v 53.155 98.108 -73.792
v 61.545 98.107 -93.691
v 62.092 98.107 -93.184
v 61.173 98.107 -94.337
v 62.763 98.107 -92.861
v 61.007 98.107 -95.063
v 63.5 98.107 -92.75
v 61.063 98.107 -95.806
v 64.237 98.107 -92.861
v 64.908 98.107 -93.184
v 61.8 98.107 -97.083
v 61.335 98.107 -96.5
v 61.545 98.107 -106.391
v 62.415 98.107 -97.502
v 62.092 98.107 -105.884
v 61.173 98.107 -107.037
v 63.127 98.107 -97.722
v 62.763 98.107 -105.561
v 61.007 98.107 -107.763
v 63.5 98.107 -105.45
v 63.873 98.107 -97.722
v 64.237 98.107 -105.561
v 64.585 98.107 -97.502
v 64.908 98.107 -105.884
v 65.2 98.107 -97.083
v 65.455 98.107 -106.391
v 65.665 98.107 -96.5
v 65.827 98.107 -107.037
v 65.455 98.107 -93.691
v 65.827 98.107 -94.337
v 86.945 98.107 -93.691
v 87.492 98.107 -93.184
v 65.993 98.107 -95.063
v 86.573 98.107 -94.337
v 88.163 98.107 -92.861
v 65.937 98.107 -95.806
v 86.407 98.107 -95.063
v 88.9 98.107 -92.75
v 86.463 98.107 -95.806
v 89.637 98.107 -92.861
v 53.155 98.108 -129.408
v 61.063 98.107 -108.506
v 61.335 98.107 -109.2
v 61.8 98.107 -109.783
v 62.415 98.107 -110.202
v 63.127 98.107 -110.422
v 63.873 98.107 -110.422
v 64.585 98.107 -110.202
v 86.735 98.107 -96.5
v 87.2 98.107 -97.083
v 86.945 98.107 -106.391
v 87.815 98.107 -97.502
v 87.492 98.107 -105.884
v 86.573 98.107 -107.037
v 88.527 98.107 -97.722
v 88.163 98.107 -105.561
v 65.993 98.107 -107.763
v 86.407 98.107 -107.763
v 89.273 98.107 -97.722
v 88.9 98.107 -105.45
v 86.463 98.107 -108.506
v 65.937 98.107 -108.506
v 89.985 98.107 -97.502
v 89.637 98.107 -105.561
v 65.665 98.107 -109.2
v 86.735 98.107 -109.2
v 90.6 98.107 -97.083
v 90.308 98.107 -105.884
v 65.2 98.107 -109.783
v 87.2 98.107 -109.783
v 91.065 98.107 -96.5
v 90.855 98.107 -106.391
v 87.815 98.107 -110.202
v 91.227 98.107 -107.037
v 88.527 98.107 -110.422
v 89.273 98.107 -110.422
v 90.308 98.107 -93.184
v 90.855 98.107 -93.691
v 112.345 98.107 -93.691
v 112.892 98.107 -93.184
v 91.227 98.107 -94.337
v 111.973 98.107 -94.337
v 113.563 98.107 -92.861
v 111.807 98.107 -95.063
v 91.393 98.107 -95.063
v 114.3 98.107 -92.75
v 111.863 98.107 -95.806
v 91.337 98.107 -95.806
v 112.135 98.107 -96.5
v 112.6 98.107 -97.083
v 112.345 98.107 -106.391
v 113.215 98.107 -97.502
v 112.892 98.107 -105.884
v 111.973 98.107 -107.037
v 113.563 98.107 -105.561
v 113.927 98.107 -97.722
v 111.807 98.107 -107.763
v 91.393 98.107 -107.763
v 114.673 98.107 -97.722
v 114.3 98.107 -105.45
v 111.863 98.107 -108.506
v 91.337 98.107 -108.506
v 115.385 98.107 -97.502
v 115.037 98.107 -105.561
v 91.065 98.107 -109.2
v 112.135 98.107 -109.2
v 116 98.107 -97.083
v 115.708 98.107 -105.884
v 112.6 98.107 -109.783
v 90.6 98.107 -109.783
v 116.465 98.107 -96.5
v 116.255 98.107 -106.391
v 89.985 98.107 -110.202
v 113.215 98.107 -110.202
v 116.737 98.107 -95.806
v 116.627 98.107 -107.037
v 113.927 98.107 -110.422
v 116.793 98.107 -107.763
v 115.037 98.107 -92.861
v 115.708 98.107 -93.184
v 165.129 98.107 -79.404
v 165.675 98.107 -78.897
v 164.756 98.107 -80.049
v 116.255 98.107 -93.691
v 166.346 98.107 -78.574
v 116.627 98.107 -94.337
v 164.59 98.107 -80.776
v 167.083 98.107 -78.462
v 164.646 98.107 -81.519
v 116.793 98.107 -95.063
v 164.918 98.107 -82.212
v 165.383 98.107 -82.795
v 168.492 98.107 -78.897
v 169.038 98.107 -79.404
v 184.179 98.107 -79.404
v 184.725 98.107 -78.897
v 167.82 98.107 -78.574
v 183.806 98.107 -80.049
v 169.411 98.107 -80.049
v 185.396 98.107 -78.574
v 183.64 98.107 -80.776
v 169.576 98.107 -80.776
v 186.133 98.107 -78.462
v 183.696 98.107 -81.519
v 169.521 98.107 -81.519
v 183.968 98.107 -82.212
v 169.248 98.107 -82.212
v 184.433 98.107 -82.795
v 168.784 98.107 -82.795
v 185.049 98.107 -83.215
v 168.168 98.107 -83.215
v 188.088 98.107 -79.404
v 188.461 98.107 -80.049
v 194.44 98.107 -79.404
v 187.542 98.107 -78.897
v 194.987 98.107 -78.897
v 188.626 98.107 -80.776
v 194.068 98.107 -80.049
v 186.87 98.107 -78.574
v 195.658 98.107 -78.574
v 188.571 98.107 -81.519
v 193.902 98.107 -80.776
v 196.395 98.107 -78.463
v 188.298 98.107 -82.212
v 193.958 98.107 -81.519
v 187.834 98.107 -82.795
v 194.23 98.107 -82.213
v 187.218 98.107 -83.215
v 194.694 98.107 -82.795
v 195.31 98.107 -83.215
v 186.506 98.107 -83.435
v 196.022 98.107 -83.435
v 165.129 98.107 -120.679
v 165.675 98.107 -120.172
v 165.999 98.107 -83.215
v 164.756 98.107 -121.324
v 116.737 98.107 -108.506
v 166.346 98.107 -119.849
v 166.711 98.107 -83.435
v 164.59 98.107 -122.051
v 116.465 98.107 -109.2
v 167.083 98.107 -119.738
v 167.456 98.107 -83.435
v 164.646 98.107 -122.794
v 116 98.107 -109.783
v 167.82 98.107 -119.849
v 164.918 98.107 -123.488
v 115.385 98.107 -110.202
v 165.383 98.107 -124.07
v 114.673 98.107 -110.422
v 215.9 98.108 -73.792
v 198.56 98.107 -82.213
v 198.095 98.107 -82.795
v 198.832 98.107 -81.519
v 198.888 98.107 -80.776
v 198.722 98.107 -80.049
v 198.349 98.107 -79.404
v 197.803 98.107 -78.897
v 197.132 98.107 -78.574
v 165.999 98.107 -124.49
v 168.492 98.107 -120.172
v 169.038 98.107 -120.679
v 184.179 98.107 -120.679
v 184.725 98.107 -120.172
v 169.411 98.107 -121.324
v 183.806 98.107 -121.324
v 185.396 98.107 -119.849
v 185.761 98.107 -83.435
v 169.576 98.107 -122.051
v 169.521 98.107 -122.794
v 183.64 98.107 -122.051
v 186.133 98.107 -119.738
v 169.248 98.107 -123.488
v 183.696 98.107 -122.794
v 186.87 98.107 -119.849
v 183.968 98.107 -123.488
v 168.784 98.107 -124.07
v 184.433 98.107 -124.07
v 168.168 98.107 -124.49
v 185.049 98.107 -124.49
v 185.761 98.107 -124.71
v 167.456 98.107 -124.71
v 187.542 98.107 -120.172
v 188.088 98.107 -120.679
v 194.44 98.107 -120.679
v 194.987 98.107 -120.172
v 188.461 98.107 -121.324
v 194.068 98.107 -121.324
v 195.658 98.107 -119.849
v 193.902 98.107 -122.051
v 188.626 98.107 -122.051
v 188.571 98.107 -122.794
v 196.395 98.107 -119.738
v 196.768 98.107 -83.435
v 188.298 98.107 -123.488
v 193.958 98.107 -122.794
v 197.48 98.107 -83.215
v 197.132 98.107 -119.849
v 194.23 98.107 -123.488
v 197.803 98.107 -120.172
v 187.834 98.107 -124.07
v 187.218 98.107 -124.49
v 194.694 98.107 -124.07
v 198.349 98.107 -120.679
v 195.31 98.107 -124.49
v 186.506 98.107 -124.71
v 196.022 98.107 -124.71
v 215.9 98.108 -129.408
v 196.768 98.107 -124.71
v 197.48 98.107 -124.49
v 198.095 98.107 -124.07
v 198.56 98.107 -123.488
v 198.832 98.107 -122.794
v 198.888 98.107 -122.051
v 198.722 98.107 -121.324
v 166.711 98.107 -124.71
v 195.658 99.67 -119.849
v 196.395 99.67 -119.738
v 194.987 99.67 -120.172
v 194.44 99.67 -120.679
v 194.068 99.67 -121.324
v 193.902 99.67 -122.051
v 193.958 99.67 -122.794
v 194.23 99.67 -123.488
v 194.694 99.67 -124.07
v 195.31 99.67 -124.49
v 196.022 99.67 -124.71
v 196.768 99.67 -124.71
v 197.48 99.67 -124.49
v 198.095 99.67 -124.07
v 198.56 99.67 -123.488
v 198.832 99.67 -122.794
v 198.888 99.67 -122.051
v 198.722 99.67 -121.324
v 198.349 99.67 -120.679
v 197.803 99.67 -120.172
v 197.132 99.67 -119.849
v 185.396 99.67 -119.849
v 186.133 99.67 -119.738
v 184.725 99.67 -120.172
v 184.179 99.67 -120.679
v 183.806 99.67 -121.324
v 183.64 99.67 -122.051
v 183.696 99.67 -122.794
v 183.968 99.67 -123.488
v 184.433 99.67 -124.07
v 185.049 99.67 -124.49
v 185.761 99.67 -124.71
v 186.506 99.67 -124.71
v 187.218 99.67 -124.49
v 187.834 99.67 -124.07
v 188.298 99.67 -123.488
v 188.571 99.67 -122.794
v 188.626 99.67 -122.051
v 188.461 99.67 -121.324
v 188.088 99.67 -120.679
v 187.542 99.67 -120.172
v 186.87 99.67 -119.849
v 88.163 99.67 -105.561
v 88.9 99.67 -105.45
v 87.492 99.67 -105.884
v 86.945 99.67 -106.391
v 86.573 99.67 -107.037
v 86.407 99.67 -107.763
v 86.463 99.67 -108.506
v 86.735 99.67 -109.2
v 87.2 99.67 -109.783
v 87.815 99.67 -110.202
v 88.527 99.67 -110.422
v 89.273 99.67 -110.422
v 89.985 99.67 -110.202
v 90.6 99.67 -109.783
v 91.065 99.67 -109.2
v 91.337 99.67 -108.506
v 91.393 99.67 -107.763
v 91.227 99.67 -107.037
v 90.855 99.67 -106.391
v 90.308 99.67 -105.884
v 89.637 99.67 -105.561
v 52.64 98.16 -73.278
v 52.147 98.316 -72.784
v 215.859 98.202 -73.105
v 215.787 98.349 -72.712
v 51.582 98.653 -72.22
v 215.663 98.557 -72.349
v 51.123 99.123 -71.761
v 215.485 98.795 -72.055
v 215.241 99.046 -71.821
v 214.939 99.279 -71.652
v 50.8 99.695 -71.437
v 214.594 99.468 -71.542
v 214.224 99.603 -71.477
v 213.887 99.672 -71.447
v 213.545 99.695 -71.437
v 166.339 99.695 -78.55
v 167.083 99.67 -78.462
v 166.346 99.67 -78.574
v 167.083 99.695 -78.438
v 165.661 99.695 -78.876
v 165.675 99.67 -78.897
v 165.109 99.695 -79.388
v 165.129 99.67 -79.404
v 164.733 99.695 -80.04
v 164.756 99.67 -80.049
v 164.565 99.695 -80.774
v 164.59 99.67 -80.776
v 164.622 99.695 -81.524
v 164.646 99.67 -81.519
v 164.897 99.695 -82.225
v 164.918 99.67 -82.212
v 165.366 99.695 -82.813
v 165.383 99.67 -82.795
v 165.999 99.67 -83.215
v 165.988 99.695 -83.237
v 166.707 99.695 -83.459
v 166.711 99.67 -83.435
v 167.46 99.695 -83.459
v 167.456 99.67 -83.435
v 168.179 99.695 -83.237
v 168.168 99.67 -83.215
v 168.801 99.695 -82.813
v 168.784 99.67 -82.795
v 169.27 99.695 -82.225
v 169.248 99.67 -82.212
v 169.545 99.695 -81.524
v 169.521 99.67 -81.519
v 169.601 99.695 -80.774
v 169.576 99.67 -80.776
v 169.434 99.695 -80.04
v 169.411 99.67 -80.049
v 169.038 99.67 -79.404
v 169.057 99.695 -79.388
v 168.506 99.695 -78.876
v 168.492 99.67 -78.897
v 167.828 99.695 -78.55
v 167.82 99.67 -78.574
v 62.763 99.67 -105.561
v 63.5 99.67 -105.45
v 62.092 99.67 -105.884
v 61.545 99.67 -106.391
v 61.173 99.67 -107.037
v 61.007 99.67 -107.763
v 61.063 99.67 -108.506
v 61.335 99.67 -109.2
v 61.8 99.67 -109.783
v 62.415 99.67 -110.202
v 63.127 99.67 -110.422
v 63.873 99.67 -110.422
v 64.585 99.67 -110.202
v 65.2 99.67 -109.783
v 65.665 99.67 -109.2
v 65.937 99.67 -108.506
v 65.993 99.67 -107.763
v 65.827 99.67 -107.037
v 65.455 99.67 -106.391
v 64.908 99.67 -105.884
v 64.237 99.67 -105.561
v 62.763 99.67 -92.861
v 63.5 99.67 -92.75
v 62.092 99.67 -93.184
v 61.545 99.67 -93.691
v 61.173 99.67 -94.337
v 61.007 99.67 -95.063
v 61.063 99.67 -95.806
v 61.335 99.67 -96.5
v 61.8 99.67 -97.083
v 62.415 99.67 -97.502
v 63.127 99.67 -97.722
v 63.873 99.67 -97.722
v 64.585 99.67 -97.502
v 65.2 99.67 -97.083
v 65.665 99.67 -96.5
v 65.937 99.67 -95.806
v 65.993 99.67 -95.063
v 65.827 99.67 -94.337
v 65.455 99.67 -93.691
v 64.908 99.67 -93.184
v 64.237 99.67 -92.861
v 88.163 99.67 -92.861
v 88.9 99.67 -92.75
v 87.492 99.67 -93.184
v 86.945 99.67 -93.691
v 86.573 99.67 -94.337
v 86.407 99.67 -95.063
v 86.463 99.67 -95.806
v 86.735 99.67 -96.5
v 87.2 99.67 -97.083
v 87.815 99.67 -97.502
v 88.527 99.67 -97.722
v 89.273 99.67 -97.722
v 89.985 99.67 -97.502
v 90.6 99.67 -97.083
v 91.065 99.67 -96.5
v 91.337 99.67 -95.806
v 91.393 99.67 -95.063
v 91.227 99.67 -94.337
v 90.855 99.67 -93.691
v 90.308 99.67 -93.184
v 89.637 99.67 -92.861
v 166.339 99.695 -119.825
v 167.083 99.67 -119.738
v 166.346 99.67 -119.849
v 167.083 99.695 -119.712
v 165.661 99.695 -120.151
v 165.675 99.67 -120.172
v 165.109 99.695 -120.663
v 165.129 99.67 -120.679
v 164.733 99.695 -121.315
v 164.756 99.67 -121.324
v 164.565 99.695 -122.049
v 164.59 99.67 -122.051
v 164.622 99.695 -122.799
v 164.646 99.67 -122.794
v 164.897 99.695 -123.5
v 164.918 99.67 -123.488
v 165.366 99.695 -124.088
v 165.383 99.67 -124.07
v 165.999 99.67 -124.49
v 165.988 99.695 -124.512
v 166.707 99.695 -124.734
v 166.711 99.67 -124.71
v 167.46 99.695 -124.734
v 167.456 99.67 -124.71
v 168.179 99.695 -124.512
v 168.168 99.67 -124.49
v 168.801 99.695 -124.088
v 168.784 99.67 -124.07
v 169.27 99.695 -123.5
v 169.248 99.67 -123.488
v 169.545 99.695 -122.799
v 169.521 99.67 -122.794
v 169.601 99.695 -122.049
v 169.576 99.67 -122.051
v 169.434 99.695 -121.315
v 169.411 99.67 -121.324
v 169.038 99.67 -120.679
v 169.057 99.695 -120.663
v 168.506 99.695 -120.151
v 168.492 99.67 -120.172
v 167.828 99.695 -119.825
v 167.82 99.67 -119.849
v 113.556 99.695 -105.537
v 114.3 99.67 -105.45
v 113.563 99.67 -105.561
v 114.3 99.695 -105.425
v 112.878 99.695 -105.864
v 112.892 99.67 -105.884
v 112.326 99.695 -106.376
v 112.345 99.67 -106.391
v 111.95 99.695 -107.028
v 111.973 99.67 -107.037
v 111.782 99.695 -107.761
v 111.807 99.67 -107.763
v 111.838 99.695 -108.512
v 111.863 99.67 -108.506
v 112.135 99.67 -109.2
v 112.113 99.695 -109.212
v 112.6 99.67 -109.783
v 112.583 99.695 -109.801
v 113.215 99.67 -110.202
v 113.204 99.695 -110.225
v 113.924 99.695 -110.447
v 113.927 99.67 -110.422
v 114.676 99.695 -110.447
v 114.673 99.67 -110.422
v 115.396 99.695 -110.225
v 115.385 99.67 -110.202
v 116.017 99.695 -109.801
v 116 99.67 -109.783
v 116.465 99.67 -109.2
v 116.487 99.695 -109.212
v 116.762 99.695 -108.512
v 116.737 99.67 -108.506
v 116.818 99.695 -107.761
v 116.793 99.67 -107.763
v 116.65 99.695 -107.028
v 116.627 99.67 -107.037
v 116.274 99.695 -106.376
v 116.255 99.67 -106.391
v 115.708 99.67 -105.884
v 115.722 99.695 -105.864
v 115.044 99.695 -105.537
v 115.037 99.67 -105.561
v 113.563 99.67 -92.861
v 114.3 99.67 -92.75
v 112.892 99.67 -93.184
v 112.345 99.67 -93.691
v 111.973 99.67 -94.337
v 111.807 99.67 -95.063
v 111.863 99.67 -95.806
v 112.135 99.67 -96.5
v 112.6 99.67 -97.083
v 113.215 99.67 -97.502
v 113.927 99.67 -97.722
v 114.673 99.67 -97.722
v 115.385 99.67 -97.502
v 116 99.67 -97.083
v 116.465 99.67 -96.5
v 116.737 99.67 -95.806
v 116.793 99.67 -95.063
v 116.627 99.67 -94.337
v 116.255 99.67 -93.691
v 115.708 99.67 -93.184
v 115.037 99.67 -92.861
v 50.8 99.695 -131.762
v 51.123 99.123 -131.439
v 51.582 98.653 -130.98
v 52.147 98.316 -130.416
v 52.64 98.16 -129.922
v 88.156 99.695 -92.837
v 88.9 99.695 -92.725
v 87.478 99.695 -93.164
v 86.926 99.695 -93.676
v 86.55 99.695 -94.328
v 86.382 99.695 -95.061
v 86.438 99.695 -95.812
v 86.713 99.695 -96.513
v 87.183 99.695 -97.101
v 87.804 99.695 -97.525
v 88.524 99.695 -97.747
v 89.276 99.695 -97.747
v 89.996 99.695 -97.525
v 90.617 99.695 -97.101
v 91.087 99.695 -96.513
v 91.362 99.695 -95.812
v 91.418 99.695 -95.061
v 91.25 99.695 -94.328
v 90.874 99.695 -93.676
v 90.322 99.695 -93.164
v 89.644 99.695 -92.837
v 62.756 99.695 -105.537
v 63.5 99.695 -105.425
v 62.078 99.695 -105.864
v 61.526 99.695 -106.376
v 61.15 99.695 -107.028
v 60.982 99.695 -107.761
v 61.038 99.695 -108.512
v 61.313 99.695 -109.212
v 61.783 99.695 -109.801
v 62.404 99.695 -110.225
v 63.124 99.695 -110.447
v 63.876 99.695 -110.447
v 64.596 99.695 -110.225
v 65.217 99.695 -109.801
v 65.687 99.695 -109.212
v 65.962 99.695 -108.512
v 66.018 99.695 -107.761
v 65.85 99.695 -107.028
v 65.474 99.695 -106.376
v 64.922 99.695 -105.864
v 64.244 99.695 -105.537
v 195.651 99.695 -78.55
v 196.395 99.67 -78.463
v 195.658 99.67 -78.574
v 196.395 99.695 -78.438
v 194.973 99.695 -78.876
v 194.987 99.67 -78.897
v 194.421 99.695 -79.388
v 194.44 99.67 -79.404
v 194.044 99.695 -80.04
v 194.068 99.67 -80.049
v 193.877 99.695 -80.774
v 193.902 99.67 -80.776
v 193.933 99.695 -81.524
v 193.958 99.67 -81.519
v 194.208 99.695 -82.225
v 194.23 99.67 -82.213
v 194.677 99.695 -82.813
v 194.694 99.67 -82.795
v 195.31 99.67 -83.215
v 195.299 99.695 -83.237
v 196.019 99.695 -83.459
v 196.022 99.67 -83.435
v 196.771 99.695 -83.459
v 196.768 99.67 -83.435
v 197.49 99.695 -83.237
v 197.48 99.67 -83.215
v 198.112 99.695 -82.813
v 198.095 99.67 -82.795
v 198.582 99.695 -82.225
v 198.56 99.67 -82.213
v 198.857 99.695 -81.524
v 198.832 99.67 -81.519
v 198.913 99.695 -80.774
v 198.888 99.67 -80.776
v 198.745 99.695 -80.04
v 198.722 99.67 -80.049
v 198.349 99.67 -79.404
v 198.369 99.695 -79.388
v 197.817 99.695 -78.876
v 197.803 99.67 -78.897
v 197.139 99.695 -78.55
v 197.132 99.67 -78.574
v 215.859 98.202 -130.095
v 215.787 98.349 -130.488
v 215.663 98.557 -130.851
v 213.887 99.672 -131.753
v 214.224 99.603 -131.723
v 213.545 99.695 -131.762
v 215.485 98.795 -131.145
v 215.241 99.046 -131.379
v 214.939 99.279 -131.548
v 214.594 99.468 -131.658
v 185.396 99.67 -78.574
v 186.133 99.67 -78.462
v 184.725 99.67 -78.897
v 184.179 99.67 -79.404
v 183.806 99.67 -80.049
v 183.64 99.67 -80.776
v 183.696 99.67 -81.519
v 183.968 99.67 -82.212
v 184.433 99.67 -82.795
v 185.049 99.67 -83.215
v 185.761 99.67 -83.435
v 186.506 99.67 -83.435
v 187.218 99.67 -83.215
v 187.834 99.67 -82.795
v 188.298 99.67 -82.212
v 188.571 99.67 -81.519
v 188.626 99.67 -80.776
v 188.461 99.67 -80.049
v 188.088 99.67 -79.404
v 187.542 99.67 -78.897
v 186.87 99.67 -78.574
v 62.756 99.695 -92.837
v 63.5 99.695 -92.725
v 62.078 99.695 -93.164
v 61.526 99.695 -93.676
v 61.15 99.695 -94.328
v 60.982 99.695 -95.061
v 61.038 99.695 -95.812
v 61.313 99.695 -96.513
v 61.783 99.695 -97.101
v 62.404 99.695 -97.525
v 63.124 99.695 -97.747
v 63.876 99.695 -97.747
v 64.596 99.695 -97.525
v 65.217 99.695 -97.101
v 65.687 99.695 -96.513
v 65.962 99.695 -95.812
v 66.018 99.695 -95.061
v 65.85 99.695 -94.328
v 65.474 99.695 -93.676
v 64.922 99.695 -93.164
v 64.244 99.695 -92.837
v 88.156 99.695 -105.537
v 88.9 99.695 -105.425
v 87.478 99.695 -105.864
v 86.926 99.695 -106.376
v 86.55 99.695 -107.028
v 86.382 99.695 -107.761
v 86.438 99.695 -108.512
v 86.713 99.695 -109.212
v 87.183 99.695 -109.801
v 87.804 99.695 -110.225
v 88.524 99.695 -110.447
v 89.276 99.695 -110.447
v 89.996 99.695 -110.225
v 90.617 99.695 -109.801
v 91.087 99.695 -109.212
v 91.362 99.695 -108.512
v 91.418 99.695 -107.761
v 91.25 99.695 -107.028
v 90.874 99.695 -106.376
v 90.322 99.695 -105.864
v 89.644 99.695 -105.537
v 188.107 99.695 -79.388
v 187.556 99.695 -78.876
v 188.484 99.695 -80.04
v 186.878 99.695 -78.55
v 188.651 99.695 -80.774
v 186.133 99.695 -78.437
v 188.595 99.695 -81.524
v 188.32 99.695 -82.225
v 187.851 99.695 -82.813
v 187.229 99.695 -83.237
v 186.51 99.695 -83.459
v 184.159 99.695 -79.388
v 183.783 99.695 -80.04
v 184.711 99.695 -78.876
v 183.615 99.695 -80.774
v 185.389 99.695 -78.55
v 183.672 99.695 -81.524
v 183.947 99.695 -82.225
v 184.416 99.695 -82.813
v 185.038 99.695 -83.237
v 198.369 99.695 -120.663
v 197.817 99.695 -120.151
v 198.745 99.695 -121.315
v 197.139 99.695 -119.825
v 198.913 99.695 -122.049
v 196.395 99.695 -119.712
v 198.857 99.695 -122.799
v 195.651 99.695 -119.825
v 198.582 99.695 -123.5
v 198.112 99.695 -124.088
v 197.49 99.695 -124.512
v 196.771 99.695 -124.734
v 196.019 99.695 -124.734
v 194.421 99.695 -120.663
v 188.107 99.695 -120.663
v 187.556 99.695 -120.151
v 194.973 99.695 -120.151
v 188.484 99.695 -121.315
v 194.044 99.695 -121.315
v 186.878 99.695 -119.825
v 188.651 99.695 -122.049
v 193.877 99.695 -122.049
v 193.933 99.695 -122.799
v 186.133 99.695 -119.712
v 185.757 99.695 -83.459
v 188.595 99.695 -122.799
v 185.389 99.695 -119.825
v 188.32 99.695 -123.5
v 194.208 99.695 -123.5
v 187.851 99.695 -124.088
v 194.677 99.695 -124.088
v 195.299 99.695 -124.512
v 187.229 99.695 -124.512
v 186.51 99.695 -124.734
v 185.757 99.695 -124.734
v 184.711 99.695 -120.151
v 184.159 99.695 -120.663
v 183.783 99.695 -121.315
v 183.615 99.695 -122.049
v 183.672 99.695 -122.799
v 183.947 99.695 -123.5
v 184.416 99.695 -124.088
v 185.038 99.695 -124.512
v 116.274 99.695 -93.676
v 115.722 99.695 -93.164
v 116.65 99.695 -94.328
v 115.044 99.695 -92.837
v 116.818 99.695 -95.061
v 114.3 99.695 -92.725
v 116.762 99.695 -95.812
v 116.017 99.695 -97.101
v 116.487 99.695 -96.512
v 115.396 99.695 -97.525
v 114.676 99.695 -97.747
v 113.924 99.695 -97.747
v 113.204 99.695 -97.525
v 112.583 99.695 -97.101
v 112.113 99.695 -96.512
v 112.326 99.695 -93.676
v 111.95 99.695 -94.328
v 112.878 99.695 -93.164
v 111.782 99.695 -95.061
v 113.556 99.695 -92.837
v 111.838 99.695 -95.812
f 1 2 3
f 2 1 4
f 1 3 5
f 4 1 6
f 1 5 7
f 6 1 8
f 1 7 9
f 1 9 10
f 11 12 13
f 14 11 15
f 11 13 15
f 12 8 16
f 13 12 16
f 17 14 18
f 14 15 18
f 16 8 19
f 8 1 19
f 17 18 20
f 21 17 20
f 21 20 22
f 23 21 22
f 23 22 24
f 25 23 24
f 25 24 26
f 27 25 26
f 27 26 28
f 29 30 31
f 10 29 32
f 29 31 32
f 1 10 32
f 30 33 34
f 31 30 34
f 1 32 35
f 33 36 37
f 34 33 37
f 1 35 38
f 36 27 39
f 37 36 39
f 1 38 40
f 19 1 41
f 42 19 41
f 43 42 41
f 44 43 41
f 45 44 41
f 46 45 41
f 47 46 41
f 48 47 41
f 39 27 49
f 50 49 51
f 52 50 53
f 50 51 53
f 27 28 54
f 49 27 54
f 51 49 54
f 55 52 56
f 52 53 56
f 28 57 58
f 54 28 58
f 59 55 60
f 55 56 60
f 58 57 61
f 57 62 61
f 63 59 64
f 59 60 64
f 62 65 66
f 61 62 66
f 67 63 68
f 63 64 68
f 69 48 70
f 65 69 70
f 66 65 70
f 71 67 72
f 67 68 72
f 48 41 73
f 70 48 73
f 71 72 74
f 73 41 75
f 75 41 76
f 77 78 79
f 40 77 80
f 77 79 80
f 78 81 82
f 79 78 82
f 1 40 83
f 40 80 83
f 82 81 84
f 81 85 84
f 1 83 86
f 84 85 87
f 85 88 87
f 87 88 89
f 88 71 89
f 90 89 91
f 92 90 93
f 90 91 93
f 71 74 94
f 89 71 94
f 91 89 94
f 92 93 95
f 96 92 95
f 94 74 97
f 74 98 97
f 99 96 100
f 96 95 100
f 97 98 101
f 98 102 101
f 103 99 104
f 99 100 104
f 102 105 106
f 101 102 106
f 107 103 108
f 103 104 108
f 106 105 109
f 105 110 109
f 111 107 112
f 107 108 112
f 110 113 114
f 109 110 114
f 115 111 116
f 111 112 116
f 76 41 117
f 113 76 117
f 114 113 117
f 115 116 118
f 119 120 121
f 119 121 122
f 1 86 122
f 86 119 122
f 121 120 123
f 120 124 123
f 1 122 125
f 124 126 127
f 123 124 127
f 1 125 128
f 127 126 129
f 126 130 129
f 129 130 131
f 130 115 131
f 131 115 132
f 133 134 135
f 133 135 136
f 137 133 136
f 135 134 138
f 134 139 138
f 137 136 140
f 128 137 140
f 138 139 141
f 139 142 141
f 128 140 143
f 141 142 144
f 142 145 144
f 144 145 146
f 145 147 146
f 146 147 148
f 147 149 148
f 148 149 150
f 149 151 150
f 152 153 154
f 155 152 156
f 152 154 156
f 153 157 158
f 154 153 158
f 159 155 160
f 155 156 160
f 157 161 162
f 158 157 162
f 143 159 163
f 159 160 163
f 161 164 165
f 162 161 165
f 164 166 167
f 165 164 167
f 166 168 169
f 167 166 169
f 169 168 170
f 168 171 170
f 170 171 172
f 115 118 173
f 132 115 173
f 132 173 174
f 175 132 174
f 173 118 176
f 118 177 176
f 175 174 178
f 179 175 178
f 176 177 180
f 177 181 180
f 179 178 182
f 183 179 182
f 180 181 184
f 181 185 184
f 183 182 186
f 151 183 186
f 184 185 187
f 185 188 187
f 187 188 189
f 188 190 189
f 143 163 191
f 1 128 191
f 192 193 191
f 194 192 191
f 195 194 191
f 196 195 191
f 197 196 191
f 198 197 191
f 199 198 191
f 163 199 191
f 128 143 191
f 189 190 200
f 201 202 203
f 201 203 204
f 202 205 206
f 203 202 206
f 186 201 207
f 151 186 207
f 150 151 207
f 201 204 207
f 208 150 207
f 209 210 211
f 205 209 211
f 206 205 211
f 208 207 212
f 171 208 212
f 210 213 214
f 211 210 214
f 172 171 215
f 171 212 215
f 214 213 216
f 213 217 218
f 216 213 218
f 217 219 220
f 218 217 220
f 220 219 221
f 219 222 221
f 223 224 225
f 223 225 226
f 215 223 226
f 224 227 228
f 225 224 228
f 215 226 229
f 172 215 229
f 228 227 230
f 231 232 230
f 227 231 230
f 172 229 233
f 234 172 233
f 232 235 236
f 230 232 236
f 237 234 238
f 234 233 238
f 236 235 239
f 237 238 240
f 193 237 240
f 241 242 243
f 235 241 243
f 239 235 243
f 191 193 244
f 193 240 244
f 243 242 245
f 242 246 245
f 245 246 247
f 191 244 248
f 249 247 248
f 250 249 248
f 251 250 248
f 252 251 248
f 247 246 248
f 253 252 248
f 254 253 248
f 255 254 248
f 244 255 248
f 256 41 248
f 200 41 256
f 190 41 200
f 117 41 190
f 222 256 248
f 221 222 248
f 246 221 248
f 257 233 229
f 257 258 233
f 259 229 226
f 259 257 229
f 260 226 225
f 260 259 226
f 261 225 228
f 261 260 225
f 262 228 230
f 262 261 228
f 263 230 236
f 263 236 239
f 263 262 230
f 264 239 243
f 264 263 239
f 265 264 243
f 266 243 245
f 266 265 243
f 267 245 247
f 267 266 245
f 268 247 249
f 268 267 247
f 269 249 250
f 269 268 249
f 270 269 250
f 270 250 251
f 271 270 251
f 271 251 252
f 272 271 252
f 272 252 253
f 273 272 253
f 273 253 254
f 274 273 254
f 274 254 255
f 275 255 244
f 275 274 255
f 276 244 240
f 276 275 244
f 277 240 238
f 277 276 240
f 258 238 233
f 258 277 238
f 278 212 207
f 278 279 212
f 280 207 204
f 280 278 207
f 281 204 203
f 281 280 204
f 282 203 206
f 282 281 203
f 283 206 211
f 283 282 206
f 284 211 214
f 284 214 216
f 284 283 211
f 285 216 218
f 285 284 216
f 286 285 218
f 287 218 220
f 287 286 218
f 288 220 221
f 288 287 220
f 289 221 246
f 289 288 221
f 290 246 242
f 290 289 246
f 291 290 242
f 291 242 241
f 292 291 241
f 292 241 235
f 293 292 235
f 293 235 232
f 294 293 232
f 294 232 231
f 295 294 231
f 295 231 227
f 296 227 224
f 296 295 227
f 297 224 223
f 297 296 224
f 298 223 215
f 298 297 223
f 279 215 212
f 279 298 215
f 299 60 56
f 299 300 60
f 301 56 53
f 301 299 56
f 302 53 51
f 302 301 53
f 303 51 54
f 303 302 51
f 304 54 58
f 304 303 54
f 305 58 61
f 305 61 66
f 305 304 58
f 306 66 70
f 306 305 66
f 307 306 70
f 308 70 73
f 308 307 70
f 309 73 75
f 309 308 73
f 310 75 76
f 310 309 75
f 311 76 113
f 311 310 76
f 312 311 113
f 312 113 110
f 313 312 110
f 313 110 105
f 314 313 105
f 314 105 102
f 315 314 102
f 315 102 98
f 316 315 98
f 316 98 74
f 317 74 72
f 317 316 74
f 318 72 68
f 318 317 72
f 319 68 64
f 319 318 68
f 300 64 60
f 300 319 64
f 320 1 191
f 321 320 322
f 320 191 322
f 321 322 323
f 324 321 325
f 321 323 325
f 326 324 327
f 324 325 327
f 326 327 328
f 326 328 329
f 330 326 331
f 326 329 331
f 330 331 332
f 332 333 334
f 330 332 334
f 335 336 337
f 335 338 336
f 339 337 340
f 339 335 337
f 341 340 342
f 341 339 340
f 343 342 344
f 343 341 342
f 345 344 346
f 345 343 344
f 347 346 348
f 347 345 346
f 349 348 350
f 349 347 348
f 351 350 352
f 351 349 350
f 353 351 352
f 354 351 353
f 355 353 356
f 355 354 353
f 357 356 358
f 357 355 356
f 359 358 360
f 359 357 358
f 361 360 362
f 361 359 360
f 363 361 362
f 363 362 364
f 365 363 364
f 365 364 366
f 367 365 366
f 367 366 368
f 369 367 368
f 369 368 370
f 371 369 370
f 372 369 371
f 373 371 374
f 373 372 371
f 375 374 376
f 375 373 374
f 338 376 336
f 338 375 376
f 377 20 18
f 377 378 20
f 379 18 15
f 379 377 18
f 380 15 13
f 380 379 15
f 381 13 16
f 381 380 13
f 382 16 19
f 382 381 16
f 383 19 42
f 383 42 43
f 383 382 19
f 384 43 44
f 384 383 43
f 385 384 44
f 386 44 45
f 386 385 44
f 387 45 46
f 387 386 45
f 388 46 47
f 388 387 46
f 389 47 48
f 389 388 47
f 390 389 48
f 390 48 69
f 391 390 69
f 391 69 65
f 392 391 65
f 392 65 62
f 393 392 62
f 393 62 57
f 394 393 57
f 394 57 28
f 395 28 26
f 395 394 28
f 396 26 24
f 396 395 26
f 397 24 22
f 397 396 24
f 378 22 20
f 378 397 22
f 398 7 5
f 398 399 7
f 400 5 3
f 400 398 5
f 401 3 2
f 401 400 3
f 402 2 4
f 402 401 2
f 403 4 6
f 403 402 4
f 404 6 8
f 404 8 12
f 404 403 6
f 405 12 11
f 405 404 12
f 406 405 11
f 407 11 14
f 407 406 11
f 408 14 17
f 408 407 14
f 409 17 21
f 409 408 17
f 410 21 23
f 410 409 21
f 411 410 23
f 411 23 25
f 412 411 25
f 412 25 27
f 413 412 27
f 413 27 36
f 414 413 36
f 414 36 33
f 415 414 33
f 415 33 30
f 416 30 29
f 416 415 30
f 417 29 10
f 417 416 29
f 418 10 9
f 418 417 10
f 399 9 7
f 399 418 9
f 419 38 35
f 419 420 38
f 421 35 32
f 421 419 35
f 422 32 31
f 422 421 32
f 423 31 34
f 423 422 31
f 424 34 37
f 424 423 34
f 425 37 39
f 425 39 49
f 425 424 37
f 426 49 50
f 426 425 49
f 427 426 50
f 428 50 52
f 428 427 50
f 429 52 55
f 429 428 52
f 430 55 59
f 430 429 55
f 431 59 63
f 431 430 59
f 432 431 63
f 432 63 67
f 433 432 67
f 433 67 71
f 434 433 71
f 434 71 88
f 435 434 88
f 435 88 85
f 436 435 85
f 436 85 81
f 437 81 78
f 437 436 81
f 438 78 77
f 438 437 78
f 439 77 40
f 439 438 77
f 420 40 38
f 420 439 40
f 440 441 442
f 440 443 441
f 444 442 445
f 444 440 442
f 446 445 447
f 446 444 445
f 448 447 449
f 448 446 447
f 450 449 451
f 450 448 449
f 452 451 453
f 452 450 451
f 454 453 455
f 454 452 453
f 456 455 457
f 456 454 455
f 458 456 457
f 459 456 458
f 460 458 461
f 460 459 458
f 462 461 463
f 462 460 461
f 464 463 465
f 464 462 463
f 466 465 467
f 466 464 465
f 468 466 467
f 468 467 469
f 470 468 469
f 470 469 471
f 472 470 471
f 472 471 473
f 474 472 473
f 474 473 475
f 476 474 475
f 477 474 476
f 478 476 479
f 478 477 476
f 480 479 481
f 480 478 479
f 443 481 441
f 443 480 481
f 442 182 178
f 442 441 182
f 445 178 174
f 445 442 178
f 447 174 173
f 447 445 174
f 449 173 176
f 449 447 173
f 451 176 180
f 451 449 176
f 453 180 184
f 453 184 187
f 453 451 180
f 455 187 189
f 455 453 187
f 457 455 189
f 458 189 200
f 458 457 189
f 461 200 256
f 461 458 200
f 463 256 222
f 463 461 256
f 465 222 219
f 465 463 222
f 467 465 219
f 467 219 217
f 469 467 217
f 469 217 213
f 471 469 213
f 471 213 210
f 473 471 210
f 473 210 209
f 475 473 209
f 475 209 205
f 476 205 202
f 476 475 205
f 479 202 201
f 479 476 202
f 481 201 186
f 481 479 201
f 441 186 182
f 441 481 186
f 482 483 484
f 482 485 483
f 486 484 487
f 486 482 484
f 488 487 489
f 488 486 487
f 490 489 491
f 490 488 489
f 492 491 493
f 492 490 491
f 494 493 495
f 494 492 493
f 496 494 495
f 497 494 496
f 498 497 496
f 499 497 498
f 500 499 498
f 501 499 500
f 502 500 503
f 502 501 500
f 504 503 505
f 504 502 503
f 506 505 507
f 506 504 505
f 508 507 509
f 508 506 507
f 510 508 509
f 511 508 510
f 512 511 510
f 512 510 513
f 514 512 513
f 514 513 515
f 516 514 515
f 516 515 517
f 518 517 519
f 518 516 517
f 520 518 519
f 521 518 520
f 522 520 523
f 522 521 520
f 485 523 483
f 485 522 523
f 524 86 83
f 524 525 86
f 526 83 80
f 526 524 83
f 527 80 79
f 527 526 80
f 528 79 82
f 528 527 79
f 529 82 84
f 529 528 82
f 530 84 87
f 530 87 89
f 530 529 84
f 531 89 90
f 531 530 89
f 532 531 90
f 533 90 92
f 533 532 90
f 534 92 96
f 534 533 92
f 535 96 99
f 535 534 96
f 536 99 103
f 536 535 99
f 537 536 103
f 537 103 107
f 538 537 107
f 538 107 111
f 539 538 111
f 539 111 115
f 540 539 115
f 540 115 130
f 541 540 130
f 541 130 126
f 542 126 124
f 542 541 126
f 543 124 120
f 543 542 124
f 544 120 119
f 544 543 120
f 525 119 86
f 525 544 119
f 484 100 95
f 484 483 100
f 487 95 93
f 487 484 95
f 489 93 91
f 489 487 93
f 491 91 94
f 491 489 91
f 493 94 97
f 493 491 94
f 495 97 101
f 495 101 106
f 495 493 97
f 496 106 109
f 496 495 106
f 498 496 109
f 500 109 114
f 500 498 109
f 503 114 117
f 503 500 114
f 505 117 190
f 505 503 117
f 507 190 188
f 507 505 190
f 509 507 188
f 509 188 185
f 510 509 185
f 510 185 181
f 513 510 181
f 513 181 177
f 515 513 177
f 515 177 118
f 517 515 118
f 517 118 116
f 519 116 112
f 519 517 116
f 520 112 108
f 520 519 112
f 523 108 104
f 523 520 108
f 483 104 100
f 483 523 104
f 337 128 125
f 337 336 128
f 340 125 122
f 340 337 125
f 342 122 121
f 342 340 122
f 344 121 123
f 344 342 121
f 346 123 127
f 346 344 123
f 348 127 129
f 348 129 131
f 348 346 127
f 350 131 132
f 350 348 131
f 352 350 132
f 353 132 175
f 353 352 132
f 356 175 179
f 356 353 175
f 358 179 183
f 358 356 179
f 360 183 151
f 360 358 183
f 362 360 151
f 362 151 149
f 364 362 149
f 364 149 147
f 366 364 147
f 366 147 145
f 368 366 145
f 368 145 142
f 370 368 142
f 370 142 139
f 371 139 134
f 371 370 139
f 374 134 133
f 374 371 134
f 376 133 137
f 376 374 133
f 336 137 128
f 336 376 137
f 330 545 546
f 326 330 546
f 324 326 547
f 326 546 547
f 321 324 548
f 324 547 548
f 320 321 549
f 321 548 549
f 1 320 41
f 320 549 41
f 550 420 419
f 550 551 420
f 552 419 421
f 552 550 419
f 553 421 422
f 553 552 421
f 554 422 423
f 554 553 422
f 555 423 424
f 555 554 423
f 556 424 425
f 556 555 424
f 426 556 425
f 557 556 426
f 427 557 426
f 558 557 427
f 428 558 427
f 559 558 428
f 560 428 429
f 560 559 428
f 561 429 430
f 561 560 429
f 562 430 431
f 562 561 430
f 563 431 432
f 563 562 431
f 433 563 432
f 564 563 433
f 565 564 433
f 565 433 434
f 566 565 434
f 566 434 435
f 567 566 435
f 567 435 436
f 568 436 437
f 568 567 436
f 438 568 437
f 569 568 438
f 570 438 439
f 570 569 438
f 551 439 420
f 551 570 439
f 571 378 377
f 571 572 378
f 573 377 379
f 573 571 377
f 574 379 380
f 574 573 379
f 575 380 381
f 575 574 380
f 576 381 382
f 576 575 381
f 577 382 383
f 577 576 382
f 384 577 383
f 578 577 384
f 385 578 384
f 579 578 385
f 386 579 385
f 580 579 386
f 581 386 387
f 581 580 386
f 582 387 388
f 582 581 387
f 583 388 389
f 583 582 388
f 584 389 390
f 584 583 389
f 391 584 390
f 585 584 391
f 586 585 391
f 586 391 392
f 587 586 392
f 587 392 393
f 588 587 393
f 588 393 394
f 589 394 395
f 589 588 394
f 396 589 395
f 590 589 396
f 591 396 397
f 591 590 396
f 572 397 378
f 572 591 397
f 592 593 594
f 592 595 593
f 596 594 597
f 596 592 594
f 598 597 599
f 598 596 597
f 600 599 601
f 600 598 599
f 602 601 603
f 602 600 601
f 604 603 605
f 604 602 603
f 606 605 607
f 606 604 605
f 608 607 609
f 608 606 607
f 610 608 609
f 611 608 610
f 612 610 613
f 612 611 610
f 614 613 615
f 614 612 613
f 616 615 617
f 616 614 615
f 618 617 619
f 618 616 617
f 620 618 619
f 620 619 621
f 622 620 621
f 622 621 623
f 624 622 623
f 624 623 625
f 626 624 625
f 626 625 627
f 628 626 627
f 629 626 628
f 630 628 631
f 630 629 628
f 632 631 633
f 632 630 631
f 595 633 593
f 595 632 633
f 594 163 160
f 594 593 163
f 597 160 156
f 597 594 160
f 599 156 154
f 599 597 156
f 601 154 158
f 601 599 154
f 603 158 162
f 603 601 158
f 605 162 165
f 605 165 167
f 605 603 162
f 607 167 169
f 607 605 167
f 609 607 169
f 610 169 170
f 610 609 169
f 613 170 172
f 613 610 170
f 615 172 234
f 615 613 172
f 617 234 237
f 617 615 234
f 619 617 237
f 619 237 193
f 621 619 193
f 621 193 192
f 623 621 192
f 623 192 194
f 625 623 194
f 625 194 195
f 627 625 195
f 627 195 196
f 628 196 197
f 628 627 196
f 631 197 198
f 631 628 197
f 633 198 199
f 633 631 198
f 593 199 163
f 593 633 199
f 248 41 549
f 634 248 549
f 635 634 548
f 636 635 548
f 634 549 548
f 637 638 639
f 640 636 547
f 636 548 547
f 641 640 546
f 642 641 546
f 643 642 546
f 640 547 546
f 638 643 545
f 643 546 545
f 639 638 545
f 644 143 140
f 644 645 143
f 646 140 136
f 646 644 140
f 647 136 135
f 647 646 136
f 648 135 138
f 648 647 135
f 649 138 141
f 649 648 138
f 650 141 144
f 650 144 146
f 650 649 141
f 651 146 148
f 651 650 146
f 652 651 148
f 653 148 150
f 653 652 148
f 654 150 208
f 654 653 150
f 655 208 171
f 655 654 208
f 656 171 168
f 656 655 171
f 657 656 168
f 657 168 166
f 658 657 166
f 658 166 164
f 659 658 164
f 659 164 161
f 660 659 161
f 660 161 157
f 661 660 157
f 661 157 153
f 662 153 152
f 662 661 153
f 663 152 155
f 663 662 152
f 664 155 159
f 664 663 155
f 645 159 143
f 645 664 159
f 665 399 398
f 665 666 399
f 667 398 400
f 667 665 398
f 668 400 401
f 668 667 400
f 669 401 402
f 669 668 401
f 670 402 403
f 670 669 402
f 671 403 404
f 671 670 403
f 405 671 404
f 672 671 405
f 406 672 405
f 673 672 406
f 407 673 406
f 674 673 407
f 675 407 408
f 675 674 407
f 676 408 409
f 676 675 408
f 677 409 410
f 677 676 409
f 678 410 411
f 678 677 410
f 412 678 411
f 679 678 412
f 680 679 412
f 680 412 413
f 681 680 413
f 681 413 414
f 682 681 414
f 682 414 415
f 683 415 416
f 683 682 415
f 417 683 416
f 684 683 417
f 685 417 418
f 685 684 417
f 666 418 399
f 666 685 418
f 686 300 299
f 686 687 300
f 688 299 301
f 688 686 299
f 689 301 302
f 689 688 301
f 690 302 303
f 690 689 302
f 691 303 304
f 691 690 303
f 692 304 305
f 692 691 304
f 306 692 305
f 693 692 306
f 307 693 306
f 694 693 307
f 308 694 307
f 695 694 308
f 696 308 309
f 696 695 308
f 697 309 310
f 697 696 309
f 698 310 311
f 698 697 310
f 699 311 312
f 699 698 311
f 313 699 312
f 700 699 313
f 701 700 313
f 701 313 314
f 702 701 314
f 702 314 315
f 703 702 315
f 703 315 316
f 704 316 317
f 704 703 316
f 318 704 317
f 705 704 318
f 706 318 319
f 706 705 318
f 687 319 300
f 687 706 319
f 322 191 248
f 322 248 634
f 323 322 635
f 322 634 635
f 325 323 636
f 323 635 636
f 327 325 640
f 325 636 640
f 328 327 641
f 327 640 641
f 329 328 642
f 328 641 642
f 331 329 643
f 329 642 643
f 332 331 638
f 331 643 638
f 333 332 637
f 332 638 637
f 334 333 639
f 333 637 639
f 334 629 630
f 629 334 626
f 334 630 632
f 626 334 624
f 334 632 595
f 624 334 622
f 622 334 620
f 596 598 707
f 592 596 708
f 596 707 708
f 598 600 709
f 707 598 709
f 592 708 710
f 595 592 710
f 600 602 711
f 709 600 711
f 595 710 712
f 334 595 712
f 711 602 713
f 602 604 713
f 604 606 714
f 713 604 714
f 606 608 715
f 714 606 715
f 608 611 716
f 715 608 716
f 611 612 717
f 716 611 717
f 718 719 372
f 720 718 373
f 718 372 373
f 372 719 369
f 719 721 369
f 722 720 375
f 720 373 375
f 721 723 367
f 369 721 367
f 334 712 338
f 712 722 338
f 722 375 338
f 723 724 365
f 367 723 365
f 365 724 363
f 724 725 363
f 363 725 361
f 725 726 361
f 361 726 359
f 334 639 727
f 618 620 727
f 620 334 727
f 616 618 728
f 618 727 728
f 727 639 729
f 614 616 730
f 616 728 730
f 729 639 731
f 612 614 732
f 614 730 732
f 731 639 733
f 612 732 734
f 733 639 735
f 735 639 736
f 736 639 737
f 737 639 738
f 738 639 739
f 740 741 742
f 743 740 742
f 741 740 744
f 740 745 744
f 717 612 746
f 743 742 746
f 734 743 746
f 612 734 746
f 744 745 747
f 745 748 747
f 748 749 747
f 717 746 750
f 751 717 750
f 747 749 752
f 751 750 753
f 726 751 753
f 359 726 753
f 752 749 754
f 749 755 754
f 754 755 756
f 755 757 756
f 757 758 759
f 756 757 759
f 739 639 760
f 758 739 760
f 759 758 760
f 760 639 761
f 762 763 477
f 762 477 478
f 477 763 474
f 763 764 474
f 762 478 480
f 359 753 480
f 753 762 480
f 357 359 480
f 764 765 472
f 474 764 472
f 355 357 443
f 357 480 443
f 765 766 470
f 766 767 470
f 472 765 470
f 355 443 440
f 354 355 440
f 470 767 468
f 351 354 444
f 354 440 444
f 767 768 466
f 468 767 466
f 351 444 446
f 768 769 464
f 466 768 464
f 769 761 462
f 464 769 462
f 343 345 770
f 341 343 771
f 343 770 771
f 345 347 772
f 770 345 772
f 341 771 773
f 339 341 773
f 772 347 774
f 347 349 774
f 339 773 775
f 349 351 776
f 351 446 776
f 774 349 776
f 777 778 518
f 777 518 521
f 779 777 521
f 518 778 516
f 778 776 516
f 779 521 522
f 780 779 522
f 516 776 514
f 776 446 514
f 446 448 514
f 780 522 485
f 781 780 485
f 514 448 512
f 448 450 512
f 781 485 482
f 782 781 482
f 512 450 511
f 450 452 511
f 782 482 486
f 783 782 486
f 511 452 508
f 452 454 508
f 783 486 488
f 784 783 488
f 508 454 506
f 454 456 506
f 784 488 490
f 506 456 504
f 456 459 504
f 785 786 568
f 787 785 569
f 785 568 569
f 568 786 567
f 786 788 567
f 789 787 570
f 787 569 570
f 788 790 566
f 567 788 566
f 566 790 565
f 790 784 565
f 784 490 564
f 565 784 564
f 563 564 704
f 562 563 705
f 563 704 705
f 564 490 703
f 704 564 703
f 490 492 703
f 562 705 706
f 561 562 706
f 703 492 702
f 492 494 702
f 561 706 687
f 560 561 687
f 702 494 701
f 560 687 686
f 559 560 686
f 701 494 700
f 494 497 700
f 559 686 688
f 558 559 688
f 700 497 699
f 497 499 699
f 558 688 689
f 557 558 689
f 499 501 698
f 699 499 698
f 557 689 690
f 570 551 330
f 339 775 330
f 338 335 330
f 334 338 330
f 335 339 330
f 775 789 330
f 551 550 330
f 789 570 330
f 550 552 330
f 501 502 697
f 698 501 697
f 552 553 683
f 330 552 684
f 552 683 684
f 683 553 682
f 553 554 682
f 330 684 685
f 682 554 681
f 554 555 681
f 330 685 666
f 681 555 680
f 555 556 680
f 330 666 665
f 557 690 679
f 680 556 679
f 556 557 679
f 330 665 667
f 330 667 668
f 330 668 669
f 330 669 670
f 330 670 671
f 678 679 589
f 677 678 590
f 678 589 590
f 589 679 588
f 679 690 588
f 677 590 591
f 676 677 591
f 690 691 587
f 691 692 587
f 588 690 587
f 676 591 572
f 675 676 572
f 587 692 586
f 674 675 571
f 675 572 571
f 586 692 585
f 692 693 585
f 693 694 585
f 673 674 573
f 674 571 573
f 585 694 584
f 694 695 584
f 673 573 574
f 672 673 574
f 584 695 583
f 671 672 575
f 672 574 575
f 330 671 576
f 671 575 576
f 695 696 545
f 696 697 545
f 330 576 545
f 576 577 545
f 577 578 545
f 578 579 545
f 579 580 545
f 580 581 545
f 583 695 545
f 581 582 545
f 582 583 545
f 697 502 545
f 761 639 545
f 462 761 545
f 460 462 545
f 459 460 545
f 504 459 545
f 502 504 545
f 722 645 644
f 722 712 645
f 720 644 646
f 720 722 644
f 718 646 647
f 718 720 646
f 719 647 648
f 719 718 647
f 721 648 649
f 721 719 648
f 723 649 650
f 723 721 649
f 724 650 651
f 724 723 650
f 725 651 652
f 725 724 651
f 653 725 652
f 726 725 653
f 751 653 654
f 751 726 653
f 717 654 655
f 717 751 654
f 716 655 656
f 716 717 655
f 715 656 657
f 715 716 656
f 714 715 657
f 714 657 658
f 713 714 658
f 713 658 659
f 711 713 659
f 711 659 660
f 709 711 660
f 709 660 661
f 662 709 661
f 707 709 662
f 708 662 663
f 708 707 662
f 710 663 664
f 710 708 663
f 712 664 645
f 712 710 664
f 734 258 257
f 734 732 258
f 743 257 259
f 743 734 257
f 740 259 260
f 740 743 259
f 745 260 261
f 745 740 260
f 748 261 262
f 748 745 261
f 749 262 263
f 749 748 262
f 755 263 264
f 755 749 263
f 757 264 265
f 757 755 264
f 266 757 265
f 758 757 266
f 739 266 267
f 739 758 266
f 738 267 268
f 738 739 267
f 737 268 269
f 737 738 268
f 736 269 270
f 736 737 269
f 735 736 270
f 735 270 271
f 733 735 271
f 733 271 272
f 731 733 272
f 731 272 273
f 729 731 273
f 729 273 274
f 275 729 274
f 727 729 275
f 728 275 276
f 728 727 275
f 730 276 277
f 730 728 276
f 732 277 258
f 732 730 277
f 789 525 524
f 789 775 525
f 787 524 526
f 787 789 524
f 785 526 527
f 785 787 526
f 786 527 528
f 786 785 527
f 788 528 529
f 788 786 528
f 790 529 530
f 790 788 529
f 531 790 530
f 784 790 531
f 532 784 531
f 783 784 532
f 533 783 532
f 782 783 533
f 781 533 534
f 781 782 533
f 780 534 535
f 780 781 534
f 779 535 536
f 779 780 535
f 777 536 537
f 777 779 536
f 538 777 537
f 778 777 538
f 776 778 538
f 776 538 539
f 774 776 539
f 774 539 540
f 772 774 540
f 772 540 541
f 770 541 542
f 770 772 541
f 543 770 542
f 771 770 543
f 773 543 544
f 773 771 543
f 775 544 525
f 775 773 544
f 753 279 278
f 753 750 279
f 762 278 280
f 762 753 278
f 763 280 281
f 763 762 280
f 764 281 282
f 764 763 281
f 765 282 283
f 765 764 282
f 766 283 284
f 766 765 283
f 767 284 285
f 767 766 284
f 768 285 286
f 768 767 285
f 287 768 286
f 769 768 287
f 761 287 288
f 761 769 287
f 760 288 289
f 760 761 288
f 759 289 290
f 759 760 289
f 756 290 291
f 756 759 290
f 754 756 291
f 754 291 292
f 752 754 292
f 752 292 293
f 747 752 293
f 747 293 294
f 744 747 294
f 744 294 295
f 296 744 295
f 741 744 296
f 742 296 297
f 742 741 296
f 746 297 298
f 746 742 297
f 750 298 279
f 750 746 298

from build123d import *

# Parameters (mm, degrees)
BOSS_EXTRUDE1_START            = -131.7625
BOSS_EXTRUDE1_DEPTH            = 60.325
F_5_0MM_DOWEL_HOLE1_AT_2_COUNT = 2
F_5_0MM_DOWEL_HOLE1_AT_2_PITCH = 12.7
F_5_0MM_DOWEL_HOLE1_AT_3_COUNT = 2
F_5_0MM_DOWEL_HOLE1_AT_3_PITCH = 28.398063314
F_5_0MM_DOWEL_HOLE1_AT_4_COUNT = 2
F_5_0MM_DOWEL_HOLE1_AT_4_PITCH = 25.4
F_5_0MM_DOWEL_HOLE1_AT_5_COUNT = 2
F_5_0MM_DOWEL_HOLE1_AT_5_PITCH = 50.8
F_5_0MM_DOWEL_HOLE1_AT_6_COUNT = 2
F_5_0MM_DOWEL_HOLE1_AT_6_PITCH = 52.363441445
FILLET2_R                      = 2.54
FILLET3_R                      = 2.54
FILLET4_R                      = 2.54
F_5_0MM_DOWEL_HOLE2_AT_2_COUNT = 2
F_5_0MM_DOWEL_HOLE2_AT_2_PITCH = 41.275
F_5_0MM_DOWEL_HOLE2_AT_3_COUNT = 2
F_5_0MM_DOWEL_HOLE2_AT_3_PITCH = 45.459081876
F_5_0MM_DOWEL_HOLE2_AT_4_COUNT = 2
F_5_0MM_DOWEL_HOLE2_AT_4_PITCH = 50.624060678
F_5_0MM_DOWEL_HOLE2_AT_5_COUNT = 2
F_5_0MM_DOWEL_HOLE2_AT_5_PITCH = 29.3116
F_5_0MM_DOWEL_HOLE2_AT_6_COUNT = 2
F_5_0MM_DOWEL_HOLE2_AT_6_PITCH = 19.05


with BuildPart() as part:
    # Sketch5 → Boss-Extrude1 (new body)
    with BuildSketch(Plane.XY.offset(BOSS_EXTRUDE1_START)):
        Polygon((50.8, 99.695), (50.8, 98.1075), (138.43, 98.1075), (215.9, 98.1075), (215.9, 99.695), align=None)
    extrude(amount=BOSS_EXTRUDE1_DEPTH)

    # Sketch7 → Ø5.0mm Dowel Hole1 (revolve, cut)
    with BuildSketch(Plane(origin=(114.3, 99.695, -107.95), x_dir=(0, 0, 1), z_dir=(1, 0, 0))):
        Polygon((0, 0), (0, 1.5875), (2.5, 1.5875), (2.5, 0.025), (2.525, 0), align=None)
    f_5_0mm_dowel_hole1 = revolve(axis=Axis((114.3, 106.045, -107.95), (0, -1, 0)), mode=Mode.SUBTRACT)

    # Ø5.0mm Dowel Hole1 at 2: Ø5.0mm Dowel Hole1 ×2
    with Locations(*[(0, 0, i * F_5_0MM_DOWEL_HOLE1_AT_2_PITCH) for i in range(1, F_5_0MM_DOWEL_HOLE1_AT_2_COUNT)]):
        add(f_5_0mm_dowel_hole1, mode=Mode.SUBTRACT)

    # Ø5.0mm Dowel Hole1 at 3: Ø5.0mm Dowel Hole1 ×2
    with Locations(*[Vector(-0.894427190999915, 0, 0.44721359549996) * (i * F_5_0MM_DOWEL_HOLE1_AT_3_PITCH) for i in range(1, F_5_0MM_DOWEL_HOLE1_AT_3_COUNT)]):
        add(f_5_0mm_dowel_hole1, mode=Mode.SUBTRACT)

    # Ø5.0mm Dowel Hole1 at 4: Ø5.0mm Dowel Hole1 ×2
    with Locations(*[(-i * F_5_0MM_DOWEL_HOLE1_AT_4_PITCH, 0, 0) for i in range(1, F_5_0MM_DOWEL_HOLE1_AT_4_COUNT)]):
        add(f_5_0mm_dowel_hole1, mode=Mode.SUBTRACT)

    # Ø5.0mm Dowel Hole1 at 5: Ø5.0mm Dowel Hole1 ×2
    with Locations(*[(-i * F_5_0MM_DOWEL_HOLE1_AT_5_PITCH, 0, 0) for i in range(1, F_5_0MM_DOWEL_HOLE1_AT_5_COUNT)]):
        add(f_5_0mm_dowel_hole1, mode=Mode.SUBTRACT)

    # Ø5.0mm Dowel Hole1 at 6: Ø5.0mm Dowel Hole1 ×2
    with Locations(*[Vector(-0.9701425001453318, 0, 0.2425356250363337) * (i * F_5_0MM_DOWEL_HOLE1_AT_6_PITCH) for i in range(1, F_5_0MM_DOWEL_HOLE1_AT_6_COUNT)]):
        add(f_5_0mm_dowel_hole1, mode=Mode.SUBTRACT)

    # Fillet2
    # the kernel refuses this fillet: 2.54 mm, written as the material it takes off along each edge
    with BuildSketch(Plane(origin=(215.9, 99.695, -137.649107549), x_dir=(-1, 0, 0), z_dir=(0, 0, 1))) as fillet2_piece_1:
        with BuildLine():
            CenterArc((2.35464302, 2.54), FILLET2_R, 202.024312837, 67.975687163)
            Line((0, 1.5875), (-0.04709286, 1.56845))
            ThreePointArc((-0.04709286, 1.56845), (-0.0508, 0.79375), (-0.0508, 0))
            Line((-0.0508, 0), (0, -0.0508))
            Line((0, -0.0508), (2.35464302, -0.0508))
            Line((2.35464302, -0.0508), (2.35464302, 0))
        make_face()
    extrude(amount=72.098215098, mode=Mode.SUBTRACT)

    # Fillet3
    # the kernel refuses this fillet: 2.54 mm, written as the material it takes off along each edge
    with BuildSketch(Plane(origin=(221.786607549, 98.1075, -71.4375), x_dir=(0, 0, -1), z_dir=(-1, 0, 0))) as fillet3_piece_1:
        with BuildLine():
            CenterArc((2.35464302, -2.54), FILLET3_R, 90, 67.975687163)
            Line((0, -1.5875), (-0.04709286, -1.56845))
            ThreePointArc((-0.04709286, -1.56845), (-0.0508, -0.79375), (-0.0508, 0))
            Line((-0.0508, 0), (0, 0.0508))
            Line((0, 0.0508), (2.35464302, 0.0508))
            Line((2.35464302, 0.0508), (2.35464302, 0))
        make_face()
    extrude(amount=176.873215098, mode=Mode.SUBTRACT)

    # Fillet4
    # the kernel refuses this fillet: 2.54 mm, written as the material it takes off along each edge
    with BuildSketch(Plane(origin=(44.913392451, 98.1075, -131.7625), x_dir=(0, 1, 0), z_dir=(1, 0, 0))) as fillet4_piece_1:
        with BuildLine():
            CenterArc((2.54, 2.35464302), FILLET4_R, 180, 67.975687163)
            Line((0, 2.35464302), (-0.0508, 2.35464302))
            Line((-0.0508, 2.35464302), (-0.0508, 0))
            Line((-0.0508, 0), (0, -0.0508))
            ThreePointArc((0, -0.0508), (0.79375, -0.0508), (1.56845, -0.04709286))
            Line((1.56845, -0.04709286), (1.5875, 0))
        make_face()
    extrude(amount=176.873215098, mode=Mode.SUBTRACT)
    with BuildSketch(Plane(origin=(50.8, 98.1075, -137.649107549), x_dir=(0, 1, 0), z_dir=(0, 0, 1))) as fillet4_piece_2:
        with BuildLine():
            CenterArc((2.54, -2.35464302), FILLET4_R, 112.024312837, 67.975687163)
            Line((0, -2.35464302), (-0.0508, -2.35464302))
            Line((-0.0508, -2.35464302), (-0.0508, 0))
            Line((-0.0508, 0), (0, 0.0508))
            ThreePointArc((0, 0.0508), (0.79375, 0.0508), (1.56845, 0.04709286))
            Line((1.56845, 0.04709286), (1.5875, 0))
        make_face()
    extrude(amount=69.743572079, mode=Mode.SUBTRACT)

    # Sketch9 → Ø5.0mm Dowel Hole2 (revolve, cut)
    with BuildSketch(Plane(origin=(167.083317581, 99.695, -122.2375), x_dir=(0, 0, 1), z_dir=(1, 0, 0))):
        Polygon((0, 0), (0, 1.5875), (2.5, 1.5875), (2.5, 0.025), (2.525, 0), align=None)
    f_5_0mm_dowel_hole2 = revolve(axis=Axis((167.083317581, 106.045, -122.2375), (0, -1, 0)), mode=Mode.SUBTRACT)

    # Ø5.0mm Dowel Hole2 at 2: Ø5.0mm Dowel Hole2 ×2
    with Locations(*[(0, 0, i * F_5_0MM_DOWEL_HOLE2_AT_2_PITCH) for i in range(1, F_5_0MM_DOWEL_HOLE2_AT_2_COUNT)]):
        add(f_5_0mm_dowel_hole2, mode=Mode.SUBTRACT)

    # Ø5.0mm Dowel Hole2 at 3: Ø5.0mm Dowel Hole2 ×2
    with Locations(*[Vector(0.41905817746174606, 0, 0.9079593845004521) * (i * F_5_0MM_DOWEL_HOLE2_AT_3_PITCH) for i in range(1, F_5_0MM_DOWEL_HOLE2_AT_3_COUNT)]):
        add(f_5_0mm_dowel_hole2, mode=Mode.SUBTRACT)

    # Ø5.0mm Dowel Hole2 at 4: Ø5.0mm Dowel Hole2 ×2
    with Locations(*[Vector(0.5790053110568745, 0, 0.8153237699024432) * (i * F_5_0MM_DOWEL_HOLE2_AT_4_PITCH) for i in range(1, F_5_0MM_DOWEL_HOLE2_AT_4_COUNT)]):
        add(f_5_0mm_dowel_hole2, mode=Mode.SUBTRACT)

    # Ø5.0mm Dowel Hole2 at 5: Ø5.0mm Dowel Hole2 ×2
    with Locations(*[(i * F_5_0MM_DOWEL_HOLE2_AT_5_PITCH, 0, 0) for i in range(1, F_5_0MM_DOWEL_HOLE2_AT_5_COUNT)]):
        add(f_5_0mm_dowel_hole2, mode=Mode.SUBTRACT)

    # Ø5.0mm Dowel Hole2 at 6: Ø5.0mm Dowel Hole2 ×2
    with Locations(*[(i * F_5_0MM_DOWEL_HOLE2_AT_6_PITCH, 0, 0) for i in range(1, F_5_0MM_DOWEL_HOLE2_AT_6_COUNT)]):
        add(f_5_0mm_dowel_hole2, mode=Mode.SUBTRACT)


solid = part.part
